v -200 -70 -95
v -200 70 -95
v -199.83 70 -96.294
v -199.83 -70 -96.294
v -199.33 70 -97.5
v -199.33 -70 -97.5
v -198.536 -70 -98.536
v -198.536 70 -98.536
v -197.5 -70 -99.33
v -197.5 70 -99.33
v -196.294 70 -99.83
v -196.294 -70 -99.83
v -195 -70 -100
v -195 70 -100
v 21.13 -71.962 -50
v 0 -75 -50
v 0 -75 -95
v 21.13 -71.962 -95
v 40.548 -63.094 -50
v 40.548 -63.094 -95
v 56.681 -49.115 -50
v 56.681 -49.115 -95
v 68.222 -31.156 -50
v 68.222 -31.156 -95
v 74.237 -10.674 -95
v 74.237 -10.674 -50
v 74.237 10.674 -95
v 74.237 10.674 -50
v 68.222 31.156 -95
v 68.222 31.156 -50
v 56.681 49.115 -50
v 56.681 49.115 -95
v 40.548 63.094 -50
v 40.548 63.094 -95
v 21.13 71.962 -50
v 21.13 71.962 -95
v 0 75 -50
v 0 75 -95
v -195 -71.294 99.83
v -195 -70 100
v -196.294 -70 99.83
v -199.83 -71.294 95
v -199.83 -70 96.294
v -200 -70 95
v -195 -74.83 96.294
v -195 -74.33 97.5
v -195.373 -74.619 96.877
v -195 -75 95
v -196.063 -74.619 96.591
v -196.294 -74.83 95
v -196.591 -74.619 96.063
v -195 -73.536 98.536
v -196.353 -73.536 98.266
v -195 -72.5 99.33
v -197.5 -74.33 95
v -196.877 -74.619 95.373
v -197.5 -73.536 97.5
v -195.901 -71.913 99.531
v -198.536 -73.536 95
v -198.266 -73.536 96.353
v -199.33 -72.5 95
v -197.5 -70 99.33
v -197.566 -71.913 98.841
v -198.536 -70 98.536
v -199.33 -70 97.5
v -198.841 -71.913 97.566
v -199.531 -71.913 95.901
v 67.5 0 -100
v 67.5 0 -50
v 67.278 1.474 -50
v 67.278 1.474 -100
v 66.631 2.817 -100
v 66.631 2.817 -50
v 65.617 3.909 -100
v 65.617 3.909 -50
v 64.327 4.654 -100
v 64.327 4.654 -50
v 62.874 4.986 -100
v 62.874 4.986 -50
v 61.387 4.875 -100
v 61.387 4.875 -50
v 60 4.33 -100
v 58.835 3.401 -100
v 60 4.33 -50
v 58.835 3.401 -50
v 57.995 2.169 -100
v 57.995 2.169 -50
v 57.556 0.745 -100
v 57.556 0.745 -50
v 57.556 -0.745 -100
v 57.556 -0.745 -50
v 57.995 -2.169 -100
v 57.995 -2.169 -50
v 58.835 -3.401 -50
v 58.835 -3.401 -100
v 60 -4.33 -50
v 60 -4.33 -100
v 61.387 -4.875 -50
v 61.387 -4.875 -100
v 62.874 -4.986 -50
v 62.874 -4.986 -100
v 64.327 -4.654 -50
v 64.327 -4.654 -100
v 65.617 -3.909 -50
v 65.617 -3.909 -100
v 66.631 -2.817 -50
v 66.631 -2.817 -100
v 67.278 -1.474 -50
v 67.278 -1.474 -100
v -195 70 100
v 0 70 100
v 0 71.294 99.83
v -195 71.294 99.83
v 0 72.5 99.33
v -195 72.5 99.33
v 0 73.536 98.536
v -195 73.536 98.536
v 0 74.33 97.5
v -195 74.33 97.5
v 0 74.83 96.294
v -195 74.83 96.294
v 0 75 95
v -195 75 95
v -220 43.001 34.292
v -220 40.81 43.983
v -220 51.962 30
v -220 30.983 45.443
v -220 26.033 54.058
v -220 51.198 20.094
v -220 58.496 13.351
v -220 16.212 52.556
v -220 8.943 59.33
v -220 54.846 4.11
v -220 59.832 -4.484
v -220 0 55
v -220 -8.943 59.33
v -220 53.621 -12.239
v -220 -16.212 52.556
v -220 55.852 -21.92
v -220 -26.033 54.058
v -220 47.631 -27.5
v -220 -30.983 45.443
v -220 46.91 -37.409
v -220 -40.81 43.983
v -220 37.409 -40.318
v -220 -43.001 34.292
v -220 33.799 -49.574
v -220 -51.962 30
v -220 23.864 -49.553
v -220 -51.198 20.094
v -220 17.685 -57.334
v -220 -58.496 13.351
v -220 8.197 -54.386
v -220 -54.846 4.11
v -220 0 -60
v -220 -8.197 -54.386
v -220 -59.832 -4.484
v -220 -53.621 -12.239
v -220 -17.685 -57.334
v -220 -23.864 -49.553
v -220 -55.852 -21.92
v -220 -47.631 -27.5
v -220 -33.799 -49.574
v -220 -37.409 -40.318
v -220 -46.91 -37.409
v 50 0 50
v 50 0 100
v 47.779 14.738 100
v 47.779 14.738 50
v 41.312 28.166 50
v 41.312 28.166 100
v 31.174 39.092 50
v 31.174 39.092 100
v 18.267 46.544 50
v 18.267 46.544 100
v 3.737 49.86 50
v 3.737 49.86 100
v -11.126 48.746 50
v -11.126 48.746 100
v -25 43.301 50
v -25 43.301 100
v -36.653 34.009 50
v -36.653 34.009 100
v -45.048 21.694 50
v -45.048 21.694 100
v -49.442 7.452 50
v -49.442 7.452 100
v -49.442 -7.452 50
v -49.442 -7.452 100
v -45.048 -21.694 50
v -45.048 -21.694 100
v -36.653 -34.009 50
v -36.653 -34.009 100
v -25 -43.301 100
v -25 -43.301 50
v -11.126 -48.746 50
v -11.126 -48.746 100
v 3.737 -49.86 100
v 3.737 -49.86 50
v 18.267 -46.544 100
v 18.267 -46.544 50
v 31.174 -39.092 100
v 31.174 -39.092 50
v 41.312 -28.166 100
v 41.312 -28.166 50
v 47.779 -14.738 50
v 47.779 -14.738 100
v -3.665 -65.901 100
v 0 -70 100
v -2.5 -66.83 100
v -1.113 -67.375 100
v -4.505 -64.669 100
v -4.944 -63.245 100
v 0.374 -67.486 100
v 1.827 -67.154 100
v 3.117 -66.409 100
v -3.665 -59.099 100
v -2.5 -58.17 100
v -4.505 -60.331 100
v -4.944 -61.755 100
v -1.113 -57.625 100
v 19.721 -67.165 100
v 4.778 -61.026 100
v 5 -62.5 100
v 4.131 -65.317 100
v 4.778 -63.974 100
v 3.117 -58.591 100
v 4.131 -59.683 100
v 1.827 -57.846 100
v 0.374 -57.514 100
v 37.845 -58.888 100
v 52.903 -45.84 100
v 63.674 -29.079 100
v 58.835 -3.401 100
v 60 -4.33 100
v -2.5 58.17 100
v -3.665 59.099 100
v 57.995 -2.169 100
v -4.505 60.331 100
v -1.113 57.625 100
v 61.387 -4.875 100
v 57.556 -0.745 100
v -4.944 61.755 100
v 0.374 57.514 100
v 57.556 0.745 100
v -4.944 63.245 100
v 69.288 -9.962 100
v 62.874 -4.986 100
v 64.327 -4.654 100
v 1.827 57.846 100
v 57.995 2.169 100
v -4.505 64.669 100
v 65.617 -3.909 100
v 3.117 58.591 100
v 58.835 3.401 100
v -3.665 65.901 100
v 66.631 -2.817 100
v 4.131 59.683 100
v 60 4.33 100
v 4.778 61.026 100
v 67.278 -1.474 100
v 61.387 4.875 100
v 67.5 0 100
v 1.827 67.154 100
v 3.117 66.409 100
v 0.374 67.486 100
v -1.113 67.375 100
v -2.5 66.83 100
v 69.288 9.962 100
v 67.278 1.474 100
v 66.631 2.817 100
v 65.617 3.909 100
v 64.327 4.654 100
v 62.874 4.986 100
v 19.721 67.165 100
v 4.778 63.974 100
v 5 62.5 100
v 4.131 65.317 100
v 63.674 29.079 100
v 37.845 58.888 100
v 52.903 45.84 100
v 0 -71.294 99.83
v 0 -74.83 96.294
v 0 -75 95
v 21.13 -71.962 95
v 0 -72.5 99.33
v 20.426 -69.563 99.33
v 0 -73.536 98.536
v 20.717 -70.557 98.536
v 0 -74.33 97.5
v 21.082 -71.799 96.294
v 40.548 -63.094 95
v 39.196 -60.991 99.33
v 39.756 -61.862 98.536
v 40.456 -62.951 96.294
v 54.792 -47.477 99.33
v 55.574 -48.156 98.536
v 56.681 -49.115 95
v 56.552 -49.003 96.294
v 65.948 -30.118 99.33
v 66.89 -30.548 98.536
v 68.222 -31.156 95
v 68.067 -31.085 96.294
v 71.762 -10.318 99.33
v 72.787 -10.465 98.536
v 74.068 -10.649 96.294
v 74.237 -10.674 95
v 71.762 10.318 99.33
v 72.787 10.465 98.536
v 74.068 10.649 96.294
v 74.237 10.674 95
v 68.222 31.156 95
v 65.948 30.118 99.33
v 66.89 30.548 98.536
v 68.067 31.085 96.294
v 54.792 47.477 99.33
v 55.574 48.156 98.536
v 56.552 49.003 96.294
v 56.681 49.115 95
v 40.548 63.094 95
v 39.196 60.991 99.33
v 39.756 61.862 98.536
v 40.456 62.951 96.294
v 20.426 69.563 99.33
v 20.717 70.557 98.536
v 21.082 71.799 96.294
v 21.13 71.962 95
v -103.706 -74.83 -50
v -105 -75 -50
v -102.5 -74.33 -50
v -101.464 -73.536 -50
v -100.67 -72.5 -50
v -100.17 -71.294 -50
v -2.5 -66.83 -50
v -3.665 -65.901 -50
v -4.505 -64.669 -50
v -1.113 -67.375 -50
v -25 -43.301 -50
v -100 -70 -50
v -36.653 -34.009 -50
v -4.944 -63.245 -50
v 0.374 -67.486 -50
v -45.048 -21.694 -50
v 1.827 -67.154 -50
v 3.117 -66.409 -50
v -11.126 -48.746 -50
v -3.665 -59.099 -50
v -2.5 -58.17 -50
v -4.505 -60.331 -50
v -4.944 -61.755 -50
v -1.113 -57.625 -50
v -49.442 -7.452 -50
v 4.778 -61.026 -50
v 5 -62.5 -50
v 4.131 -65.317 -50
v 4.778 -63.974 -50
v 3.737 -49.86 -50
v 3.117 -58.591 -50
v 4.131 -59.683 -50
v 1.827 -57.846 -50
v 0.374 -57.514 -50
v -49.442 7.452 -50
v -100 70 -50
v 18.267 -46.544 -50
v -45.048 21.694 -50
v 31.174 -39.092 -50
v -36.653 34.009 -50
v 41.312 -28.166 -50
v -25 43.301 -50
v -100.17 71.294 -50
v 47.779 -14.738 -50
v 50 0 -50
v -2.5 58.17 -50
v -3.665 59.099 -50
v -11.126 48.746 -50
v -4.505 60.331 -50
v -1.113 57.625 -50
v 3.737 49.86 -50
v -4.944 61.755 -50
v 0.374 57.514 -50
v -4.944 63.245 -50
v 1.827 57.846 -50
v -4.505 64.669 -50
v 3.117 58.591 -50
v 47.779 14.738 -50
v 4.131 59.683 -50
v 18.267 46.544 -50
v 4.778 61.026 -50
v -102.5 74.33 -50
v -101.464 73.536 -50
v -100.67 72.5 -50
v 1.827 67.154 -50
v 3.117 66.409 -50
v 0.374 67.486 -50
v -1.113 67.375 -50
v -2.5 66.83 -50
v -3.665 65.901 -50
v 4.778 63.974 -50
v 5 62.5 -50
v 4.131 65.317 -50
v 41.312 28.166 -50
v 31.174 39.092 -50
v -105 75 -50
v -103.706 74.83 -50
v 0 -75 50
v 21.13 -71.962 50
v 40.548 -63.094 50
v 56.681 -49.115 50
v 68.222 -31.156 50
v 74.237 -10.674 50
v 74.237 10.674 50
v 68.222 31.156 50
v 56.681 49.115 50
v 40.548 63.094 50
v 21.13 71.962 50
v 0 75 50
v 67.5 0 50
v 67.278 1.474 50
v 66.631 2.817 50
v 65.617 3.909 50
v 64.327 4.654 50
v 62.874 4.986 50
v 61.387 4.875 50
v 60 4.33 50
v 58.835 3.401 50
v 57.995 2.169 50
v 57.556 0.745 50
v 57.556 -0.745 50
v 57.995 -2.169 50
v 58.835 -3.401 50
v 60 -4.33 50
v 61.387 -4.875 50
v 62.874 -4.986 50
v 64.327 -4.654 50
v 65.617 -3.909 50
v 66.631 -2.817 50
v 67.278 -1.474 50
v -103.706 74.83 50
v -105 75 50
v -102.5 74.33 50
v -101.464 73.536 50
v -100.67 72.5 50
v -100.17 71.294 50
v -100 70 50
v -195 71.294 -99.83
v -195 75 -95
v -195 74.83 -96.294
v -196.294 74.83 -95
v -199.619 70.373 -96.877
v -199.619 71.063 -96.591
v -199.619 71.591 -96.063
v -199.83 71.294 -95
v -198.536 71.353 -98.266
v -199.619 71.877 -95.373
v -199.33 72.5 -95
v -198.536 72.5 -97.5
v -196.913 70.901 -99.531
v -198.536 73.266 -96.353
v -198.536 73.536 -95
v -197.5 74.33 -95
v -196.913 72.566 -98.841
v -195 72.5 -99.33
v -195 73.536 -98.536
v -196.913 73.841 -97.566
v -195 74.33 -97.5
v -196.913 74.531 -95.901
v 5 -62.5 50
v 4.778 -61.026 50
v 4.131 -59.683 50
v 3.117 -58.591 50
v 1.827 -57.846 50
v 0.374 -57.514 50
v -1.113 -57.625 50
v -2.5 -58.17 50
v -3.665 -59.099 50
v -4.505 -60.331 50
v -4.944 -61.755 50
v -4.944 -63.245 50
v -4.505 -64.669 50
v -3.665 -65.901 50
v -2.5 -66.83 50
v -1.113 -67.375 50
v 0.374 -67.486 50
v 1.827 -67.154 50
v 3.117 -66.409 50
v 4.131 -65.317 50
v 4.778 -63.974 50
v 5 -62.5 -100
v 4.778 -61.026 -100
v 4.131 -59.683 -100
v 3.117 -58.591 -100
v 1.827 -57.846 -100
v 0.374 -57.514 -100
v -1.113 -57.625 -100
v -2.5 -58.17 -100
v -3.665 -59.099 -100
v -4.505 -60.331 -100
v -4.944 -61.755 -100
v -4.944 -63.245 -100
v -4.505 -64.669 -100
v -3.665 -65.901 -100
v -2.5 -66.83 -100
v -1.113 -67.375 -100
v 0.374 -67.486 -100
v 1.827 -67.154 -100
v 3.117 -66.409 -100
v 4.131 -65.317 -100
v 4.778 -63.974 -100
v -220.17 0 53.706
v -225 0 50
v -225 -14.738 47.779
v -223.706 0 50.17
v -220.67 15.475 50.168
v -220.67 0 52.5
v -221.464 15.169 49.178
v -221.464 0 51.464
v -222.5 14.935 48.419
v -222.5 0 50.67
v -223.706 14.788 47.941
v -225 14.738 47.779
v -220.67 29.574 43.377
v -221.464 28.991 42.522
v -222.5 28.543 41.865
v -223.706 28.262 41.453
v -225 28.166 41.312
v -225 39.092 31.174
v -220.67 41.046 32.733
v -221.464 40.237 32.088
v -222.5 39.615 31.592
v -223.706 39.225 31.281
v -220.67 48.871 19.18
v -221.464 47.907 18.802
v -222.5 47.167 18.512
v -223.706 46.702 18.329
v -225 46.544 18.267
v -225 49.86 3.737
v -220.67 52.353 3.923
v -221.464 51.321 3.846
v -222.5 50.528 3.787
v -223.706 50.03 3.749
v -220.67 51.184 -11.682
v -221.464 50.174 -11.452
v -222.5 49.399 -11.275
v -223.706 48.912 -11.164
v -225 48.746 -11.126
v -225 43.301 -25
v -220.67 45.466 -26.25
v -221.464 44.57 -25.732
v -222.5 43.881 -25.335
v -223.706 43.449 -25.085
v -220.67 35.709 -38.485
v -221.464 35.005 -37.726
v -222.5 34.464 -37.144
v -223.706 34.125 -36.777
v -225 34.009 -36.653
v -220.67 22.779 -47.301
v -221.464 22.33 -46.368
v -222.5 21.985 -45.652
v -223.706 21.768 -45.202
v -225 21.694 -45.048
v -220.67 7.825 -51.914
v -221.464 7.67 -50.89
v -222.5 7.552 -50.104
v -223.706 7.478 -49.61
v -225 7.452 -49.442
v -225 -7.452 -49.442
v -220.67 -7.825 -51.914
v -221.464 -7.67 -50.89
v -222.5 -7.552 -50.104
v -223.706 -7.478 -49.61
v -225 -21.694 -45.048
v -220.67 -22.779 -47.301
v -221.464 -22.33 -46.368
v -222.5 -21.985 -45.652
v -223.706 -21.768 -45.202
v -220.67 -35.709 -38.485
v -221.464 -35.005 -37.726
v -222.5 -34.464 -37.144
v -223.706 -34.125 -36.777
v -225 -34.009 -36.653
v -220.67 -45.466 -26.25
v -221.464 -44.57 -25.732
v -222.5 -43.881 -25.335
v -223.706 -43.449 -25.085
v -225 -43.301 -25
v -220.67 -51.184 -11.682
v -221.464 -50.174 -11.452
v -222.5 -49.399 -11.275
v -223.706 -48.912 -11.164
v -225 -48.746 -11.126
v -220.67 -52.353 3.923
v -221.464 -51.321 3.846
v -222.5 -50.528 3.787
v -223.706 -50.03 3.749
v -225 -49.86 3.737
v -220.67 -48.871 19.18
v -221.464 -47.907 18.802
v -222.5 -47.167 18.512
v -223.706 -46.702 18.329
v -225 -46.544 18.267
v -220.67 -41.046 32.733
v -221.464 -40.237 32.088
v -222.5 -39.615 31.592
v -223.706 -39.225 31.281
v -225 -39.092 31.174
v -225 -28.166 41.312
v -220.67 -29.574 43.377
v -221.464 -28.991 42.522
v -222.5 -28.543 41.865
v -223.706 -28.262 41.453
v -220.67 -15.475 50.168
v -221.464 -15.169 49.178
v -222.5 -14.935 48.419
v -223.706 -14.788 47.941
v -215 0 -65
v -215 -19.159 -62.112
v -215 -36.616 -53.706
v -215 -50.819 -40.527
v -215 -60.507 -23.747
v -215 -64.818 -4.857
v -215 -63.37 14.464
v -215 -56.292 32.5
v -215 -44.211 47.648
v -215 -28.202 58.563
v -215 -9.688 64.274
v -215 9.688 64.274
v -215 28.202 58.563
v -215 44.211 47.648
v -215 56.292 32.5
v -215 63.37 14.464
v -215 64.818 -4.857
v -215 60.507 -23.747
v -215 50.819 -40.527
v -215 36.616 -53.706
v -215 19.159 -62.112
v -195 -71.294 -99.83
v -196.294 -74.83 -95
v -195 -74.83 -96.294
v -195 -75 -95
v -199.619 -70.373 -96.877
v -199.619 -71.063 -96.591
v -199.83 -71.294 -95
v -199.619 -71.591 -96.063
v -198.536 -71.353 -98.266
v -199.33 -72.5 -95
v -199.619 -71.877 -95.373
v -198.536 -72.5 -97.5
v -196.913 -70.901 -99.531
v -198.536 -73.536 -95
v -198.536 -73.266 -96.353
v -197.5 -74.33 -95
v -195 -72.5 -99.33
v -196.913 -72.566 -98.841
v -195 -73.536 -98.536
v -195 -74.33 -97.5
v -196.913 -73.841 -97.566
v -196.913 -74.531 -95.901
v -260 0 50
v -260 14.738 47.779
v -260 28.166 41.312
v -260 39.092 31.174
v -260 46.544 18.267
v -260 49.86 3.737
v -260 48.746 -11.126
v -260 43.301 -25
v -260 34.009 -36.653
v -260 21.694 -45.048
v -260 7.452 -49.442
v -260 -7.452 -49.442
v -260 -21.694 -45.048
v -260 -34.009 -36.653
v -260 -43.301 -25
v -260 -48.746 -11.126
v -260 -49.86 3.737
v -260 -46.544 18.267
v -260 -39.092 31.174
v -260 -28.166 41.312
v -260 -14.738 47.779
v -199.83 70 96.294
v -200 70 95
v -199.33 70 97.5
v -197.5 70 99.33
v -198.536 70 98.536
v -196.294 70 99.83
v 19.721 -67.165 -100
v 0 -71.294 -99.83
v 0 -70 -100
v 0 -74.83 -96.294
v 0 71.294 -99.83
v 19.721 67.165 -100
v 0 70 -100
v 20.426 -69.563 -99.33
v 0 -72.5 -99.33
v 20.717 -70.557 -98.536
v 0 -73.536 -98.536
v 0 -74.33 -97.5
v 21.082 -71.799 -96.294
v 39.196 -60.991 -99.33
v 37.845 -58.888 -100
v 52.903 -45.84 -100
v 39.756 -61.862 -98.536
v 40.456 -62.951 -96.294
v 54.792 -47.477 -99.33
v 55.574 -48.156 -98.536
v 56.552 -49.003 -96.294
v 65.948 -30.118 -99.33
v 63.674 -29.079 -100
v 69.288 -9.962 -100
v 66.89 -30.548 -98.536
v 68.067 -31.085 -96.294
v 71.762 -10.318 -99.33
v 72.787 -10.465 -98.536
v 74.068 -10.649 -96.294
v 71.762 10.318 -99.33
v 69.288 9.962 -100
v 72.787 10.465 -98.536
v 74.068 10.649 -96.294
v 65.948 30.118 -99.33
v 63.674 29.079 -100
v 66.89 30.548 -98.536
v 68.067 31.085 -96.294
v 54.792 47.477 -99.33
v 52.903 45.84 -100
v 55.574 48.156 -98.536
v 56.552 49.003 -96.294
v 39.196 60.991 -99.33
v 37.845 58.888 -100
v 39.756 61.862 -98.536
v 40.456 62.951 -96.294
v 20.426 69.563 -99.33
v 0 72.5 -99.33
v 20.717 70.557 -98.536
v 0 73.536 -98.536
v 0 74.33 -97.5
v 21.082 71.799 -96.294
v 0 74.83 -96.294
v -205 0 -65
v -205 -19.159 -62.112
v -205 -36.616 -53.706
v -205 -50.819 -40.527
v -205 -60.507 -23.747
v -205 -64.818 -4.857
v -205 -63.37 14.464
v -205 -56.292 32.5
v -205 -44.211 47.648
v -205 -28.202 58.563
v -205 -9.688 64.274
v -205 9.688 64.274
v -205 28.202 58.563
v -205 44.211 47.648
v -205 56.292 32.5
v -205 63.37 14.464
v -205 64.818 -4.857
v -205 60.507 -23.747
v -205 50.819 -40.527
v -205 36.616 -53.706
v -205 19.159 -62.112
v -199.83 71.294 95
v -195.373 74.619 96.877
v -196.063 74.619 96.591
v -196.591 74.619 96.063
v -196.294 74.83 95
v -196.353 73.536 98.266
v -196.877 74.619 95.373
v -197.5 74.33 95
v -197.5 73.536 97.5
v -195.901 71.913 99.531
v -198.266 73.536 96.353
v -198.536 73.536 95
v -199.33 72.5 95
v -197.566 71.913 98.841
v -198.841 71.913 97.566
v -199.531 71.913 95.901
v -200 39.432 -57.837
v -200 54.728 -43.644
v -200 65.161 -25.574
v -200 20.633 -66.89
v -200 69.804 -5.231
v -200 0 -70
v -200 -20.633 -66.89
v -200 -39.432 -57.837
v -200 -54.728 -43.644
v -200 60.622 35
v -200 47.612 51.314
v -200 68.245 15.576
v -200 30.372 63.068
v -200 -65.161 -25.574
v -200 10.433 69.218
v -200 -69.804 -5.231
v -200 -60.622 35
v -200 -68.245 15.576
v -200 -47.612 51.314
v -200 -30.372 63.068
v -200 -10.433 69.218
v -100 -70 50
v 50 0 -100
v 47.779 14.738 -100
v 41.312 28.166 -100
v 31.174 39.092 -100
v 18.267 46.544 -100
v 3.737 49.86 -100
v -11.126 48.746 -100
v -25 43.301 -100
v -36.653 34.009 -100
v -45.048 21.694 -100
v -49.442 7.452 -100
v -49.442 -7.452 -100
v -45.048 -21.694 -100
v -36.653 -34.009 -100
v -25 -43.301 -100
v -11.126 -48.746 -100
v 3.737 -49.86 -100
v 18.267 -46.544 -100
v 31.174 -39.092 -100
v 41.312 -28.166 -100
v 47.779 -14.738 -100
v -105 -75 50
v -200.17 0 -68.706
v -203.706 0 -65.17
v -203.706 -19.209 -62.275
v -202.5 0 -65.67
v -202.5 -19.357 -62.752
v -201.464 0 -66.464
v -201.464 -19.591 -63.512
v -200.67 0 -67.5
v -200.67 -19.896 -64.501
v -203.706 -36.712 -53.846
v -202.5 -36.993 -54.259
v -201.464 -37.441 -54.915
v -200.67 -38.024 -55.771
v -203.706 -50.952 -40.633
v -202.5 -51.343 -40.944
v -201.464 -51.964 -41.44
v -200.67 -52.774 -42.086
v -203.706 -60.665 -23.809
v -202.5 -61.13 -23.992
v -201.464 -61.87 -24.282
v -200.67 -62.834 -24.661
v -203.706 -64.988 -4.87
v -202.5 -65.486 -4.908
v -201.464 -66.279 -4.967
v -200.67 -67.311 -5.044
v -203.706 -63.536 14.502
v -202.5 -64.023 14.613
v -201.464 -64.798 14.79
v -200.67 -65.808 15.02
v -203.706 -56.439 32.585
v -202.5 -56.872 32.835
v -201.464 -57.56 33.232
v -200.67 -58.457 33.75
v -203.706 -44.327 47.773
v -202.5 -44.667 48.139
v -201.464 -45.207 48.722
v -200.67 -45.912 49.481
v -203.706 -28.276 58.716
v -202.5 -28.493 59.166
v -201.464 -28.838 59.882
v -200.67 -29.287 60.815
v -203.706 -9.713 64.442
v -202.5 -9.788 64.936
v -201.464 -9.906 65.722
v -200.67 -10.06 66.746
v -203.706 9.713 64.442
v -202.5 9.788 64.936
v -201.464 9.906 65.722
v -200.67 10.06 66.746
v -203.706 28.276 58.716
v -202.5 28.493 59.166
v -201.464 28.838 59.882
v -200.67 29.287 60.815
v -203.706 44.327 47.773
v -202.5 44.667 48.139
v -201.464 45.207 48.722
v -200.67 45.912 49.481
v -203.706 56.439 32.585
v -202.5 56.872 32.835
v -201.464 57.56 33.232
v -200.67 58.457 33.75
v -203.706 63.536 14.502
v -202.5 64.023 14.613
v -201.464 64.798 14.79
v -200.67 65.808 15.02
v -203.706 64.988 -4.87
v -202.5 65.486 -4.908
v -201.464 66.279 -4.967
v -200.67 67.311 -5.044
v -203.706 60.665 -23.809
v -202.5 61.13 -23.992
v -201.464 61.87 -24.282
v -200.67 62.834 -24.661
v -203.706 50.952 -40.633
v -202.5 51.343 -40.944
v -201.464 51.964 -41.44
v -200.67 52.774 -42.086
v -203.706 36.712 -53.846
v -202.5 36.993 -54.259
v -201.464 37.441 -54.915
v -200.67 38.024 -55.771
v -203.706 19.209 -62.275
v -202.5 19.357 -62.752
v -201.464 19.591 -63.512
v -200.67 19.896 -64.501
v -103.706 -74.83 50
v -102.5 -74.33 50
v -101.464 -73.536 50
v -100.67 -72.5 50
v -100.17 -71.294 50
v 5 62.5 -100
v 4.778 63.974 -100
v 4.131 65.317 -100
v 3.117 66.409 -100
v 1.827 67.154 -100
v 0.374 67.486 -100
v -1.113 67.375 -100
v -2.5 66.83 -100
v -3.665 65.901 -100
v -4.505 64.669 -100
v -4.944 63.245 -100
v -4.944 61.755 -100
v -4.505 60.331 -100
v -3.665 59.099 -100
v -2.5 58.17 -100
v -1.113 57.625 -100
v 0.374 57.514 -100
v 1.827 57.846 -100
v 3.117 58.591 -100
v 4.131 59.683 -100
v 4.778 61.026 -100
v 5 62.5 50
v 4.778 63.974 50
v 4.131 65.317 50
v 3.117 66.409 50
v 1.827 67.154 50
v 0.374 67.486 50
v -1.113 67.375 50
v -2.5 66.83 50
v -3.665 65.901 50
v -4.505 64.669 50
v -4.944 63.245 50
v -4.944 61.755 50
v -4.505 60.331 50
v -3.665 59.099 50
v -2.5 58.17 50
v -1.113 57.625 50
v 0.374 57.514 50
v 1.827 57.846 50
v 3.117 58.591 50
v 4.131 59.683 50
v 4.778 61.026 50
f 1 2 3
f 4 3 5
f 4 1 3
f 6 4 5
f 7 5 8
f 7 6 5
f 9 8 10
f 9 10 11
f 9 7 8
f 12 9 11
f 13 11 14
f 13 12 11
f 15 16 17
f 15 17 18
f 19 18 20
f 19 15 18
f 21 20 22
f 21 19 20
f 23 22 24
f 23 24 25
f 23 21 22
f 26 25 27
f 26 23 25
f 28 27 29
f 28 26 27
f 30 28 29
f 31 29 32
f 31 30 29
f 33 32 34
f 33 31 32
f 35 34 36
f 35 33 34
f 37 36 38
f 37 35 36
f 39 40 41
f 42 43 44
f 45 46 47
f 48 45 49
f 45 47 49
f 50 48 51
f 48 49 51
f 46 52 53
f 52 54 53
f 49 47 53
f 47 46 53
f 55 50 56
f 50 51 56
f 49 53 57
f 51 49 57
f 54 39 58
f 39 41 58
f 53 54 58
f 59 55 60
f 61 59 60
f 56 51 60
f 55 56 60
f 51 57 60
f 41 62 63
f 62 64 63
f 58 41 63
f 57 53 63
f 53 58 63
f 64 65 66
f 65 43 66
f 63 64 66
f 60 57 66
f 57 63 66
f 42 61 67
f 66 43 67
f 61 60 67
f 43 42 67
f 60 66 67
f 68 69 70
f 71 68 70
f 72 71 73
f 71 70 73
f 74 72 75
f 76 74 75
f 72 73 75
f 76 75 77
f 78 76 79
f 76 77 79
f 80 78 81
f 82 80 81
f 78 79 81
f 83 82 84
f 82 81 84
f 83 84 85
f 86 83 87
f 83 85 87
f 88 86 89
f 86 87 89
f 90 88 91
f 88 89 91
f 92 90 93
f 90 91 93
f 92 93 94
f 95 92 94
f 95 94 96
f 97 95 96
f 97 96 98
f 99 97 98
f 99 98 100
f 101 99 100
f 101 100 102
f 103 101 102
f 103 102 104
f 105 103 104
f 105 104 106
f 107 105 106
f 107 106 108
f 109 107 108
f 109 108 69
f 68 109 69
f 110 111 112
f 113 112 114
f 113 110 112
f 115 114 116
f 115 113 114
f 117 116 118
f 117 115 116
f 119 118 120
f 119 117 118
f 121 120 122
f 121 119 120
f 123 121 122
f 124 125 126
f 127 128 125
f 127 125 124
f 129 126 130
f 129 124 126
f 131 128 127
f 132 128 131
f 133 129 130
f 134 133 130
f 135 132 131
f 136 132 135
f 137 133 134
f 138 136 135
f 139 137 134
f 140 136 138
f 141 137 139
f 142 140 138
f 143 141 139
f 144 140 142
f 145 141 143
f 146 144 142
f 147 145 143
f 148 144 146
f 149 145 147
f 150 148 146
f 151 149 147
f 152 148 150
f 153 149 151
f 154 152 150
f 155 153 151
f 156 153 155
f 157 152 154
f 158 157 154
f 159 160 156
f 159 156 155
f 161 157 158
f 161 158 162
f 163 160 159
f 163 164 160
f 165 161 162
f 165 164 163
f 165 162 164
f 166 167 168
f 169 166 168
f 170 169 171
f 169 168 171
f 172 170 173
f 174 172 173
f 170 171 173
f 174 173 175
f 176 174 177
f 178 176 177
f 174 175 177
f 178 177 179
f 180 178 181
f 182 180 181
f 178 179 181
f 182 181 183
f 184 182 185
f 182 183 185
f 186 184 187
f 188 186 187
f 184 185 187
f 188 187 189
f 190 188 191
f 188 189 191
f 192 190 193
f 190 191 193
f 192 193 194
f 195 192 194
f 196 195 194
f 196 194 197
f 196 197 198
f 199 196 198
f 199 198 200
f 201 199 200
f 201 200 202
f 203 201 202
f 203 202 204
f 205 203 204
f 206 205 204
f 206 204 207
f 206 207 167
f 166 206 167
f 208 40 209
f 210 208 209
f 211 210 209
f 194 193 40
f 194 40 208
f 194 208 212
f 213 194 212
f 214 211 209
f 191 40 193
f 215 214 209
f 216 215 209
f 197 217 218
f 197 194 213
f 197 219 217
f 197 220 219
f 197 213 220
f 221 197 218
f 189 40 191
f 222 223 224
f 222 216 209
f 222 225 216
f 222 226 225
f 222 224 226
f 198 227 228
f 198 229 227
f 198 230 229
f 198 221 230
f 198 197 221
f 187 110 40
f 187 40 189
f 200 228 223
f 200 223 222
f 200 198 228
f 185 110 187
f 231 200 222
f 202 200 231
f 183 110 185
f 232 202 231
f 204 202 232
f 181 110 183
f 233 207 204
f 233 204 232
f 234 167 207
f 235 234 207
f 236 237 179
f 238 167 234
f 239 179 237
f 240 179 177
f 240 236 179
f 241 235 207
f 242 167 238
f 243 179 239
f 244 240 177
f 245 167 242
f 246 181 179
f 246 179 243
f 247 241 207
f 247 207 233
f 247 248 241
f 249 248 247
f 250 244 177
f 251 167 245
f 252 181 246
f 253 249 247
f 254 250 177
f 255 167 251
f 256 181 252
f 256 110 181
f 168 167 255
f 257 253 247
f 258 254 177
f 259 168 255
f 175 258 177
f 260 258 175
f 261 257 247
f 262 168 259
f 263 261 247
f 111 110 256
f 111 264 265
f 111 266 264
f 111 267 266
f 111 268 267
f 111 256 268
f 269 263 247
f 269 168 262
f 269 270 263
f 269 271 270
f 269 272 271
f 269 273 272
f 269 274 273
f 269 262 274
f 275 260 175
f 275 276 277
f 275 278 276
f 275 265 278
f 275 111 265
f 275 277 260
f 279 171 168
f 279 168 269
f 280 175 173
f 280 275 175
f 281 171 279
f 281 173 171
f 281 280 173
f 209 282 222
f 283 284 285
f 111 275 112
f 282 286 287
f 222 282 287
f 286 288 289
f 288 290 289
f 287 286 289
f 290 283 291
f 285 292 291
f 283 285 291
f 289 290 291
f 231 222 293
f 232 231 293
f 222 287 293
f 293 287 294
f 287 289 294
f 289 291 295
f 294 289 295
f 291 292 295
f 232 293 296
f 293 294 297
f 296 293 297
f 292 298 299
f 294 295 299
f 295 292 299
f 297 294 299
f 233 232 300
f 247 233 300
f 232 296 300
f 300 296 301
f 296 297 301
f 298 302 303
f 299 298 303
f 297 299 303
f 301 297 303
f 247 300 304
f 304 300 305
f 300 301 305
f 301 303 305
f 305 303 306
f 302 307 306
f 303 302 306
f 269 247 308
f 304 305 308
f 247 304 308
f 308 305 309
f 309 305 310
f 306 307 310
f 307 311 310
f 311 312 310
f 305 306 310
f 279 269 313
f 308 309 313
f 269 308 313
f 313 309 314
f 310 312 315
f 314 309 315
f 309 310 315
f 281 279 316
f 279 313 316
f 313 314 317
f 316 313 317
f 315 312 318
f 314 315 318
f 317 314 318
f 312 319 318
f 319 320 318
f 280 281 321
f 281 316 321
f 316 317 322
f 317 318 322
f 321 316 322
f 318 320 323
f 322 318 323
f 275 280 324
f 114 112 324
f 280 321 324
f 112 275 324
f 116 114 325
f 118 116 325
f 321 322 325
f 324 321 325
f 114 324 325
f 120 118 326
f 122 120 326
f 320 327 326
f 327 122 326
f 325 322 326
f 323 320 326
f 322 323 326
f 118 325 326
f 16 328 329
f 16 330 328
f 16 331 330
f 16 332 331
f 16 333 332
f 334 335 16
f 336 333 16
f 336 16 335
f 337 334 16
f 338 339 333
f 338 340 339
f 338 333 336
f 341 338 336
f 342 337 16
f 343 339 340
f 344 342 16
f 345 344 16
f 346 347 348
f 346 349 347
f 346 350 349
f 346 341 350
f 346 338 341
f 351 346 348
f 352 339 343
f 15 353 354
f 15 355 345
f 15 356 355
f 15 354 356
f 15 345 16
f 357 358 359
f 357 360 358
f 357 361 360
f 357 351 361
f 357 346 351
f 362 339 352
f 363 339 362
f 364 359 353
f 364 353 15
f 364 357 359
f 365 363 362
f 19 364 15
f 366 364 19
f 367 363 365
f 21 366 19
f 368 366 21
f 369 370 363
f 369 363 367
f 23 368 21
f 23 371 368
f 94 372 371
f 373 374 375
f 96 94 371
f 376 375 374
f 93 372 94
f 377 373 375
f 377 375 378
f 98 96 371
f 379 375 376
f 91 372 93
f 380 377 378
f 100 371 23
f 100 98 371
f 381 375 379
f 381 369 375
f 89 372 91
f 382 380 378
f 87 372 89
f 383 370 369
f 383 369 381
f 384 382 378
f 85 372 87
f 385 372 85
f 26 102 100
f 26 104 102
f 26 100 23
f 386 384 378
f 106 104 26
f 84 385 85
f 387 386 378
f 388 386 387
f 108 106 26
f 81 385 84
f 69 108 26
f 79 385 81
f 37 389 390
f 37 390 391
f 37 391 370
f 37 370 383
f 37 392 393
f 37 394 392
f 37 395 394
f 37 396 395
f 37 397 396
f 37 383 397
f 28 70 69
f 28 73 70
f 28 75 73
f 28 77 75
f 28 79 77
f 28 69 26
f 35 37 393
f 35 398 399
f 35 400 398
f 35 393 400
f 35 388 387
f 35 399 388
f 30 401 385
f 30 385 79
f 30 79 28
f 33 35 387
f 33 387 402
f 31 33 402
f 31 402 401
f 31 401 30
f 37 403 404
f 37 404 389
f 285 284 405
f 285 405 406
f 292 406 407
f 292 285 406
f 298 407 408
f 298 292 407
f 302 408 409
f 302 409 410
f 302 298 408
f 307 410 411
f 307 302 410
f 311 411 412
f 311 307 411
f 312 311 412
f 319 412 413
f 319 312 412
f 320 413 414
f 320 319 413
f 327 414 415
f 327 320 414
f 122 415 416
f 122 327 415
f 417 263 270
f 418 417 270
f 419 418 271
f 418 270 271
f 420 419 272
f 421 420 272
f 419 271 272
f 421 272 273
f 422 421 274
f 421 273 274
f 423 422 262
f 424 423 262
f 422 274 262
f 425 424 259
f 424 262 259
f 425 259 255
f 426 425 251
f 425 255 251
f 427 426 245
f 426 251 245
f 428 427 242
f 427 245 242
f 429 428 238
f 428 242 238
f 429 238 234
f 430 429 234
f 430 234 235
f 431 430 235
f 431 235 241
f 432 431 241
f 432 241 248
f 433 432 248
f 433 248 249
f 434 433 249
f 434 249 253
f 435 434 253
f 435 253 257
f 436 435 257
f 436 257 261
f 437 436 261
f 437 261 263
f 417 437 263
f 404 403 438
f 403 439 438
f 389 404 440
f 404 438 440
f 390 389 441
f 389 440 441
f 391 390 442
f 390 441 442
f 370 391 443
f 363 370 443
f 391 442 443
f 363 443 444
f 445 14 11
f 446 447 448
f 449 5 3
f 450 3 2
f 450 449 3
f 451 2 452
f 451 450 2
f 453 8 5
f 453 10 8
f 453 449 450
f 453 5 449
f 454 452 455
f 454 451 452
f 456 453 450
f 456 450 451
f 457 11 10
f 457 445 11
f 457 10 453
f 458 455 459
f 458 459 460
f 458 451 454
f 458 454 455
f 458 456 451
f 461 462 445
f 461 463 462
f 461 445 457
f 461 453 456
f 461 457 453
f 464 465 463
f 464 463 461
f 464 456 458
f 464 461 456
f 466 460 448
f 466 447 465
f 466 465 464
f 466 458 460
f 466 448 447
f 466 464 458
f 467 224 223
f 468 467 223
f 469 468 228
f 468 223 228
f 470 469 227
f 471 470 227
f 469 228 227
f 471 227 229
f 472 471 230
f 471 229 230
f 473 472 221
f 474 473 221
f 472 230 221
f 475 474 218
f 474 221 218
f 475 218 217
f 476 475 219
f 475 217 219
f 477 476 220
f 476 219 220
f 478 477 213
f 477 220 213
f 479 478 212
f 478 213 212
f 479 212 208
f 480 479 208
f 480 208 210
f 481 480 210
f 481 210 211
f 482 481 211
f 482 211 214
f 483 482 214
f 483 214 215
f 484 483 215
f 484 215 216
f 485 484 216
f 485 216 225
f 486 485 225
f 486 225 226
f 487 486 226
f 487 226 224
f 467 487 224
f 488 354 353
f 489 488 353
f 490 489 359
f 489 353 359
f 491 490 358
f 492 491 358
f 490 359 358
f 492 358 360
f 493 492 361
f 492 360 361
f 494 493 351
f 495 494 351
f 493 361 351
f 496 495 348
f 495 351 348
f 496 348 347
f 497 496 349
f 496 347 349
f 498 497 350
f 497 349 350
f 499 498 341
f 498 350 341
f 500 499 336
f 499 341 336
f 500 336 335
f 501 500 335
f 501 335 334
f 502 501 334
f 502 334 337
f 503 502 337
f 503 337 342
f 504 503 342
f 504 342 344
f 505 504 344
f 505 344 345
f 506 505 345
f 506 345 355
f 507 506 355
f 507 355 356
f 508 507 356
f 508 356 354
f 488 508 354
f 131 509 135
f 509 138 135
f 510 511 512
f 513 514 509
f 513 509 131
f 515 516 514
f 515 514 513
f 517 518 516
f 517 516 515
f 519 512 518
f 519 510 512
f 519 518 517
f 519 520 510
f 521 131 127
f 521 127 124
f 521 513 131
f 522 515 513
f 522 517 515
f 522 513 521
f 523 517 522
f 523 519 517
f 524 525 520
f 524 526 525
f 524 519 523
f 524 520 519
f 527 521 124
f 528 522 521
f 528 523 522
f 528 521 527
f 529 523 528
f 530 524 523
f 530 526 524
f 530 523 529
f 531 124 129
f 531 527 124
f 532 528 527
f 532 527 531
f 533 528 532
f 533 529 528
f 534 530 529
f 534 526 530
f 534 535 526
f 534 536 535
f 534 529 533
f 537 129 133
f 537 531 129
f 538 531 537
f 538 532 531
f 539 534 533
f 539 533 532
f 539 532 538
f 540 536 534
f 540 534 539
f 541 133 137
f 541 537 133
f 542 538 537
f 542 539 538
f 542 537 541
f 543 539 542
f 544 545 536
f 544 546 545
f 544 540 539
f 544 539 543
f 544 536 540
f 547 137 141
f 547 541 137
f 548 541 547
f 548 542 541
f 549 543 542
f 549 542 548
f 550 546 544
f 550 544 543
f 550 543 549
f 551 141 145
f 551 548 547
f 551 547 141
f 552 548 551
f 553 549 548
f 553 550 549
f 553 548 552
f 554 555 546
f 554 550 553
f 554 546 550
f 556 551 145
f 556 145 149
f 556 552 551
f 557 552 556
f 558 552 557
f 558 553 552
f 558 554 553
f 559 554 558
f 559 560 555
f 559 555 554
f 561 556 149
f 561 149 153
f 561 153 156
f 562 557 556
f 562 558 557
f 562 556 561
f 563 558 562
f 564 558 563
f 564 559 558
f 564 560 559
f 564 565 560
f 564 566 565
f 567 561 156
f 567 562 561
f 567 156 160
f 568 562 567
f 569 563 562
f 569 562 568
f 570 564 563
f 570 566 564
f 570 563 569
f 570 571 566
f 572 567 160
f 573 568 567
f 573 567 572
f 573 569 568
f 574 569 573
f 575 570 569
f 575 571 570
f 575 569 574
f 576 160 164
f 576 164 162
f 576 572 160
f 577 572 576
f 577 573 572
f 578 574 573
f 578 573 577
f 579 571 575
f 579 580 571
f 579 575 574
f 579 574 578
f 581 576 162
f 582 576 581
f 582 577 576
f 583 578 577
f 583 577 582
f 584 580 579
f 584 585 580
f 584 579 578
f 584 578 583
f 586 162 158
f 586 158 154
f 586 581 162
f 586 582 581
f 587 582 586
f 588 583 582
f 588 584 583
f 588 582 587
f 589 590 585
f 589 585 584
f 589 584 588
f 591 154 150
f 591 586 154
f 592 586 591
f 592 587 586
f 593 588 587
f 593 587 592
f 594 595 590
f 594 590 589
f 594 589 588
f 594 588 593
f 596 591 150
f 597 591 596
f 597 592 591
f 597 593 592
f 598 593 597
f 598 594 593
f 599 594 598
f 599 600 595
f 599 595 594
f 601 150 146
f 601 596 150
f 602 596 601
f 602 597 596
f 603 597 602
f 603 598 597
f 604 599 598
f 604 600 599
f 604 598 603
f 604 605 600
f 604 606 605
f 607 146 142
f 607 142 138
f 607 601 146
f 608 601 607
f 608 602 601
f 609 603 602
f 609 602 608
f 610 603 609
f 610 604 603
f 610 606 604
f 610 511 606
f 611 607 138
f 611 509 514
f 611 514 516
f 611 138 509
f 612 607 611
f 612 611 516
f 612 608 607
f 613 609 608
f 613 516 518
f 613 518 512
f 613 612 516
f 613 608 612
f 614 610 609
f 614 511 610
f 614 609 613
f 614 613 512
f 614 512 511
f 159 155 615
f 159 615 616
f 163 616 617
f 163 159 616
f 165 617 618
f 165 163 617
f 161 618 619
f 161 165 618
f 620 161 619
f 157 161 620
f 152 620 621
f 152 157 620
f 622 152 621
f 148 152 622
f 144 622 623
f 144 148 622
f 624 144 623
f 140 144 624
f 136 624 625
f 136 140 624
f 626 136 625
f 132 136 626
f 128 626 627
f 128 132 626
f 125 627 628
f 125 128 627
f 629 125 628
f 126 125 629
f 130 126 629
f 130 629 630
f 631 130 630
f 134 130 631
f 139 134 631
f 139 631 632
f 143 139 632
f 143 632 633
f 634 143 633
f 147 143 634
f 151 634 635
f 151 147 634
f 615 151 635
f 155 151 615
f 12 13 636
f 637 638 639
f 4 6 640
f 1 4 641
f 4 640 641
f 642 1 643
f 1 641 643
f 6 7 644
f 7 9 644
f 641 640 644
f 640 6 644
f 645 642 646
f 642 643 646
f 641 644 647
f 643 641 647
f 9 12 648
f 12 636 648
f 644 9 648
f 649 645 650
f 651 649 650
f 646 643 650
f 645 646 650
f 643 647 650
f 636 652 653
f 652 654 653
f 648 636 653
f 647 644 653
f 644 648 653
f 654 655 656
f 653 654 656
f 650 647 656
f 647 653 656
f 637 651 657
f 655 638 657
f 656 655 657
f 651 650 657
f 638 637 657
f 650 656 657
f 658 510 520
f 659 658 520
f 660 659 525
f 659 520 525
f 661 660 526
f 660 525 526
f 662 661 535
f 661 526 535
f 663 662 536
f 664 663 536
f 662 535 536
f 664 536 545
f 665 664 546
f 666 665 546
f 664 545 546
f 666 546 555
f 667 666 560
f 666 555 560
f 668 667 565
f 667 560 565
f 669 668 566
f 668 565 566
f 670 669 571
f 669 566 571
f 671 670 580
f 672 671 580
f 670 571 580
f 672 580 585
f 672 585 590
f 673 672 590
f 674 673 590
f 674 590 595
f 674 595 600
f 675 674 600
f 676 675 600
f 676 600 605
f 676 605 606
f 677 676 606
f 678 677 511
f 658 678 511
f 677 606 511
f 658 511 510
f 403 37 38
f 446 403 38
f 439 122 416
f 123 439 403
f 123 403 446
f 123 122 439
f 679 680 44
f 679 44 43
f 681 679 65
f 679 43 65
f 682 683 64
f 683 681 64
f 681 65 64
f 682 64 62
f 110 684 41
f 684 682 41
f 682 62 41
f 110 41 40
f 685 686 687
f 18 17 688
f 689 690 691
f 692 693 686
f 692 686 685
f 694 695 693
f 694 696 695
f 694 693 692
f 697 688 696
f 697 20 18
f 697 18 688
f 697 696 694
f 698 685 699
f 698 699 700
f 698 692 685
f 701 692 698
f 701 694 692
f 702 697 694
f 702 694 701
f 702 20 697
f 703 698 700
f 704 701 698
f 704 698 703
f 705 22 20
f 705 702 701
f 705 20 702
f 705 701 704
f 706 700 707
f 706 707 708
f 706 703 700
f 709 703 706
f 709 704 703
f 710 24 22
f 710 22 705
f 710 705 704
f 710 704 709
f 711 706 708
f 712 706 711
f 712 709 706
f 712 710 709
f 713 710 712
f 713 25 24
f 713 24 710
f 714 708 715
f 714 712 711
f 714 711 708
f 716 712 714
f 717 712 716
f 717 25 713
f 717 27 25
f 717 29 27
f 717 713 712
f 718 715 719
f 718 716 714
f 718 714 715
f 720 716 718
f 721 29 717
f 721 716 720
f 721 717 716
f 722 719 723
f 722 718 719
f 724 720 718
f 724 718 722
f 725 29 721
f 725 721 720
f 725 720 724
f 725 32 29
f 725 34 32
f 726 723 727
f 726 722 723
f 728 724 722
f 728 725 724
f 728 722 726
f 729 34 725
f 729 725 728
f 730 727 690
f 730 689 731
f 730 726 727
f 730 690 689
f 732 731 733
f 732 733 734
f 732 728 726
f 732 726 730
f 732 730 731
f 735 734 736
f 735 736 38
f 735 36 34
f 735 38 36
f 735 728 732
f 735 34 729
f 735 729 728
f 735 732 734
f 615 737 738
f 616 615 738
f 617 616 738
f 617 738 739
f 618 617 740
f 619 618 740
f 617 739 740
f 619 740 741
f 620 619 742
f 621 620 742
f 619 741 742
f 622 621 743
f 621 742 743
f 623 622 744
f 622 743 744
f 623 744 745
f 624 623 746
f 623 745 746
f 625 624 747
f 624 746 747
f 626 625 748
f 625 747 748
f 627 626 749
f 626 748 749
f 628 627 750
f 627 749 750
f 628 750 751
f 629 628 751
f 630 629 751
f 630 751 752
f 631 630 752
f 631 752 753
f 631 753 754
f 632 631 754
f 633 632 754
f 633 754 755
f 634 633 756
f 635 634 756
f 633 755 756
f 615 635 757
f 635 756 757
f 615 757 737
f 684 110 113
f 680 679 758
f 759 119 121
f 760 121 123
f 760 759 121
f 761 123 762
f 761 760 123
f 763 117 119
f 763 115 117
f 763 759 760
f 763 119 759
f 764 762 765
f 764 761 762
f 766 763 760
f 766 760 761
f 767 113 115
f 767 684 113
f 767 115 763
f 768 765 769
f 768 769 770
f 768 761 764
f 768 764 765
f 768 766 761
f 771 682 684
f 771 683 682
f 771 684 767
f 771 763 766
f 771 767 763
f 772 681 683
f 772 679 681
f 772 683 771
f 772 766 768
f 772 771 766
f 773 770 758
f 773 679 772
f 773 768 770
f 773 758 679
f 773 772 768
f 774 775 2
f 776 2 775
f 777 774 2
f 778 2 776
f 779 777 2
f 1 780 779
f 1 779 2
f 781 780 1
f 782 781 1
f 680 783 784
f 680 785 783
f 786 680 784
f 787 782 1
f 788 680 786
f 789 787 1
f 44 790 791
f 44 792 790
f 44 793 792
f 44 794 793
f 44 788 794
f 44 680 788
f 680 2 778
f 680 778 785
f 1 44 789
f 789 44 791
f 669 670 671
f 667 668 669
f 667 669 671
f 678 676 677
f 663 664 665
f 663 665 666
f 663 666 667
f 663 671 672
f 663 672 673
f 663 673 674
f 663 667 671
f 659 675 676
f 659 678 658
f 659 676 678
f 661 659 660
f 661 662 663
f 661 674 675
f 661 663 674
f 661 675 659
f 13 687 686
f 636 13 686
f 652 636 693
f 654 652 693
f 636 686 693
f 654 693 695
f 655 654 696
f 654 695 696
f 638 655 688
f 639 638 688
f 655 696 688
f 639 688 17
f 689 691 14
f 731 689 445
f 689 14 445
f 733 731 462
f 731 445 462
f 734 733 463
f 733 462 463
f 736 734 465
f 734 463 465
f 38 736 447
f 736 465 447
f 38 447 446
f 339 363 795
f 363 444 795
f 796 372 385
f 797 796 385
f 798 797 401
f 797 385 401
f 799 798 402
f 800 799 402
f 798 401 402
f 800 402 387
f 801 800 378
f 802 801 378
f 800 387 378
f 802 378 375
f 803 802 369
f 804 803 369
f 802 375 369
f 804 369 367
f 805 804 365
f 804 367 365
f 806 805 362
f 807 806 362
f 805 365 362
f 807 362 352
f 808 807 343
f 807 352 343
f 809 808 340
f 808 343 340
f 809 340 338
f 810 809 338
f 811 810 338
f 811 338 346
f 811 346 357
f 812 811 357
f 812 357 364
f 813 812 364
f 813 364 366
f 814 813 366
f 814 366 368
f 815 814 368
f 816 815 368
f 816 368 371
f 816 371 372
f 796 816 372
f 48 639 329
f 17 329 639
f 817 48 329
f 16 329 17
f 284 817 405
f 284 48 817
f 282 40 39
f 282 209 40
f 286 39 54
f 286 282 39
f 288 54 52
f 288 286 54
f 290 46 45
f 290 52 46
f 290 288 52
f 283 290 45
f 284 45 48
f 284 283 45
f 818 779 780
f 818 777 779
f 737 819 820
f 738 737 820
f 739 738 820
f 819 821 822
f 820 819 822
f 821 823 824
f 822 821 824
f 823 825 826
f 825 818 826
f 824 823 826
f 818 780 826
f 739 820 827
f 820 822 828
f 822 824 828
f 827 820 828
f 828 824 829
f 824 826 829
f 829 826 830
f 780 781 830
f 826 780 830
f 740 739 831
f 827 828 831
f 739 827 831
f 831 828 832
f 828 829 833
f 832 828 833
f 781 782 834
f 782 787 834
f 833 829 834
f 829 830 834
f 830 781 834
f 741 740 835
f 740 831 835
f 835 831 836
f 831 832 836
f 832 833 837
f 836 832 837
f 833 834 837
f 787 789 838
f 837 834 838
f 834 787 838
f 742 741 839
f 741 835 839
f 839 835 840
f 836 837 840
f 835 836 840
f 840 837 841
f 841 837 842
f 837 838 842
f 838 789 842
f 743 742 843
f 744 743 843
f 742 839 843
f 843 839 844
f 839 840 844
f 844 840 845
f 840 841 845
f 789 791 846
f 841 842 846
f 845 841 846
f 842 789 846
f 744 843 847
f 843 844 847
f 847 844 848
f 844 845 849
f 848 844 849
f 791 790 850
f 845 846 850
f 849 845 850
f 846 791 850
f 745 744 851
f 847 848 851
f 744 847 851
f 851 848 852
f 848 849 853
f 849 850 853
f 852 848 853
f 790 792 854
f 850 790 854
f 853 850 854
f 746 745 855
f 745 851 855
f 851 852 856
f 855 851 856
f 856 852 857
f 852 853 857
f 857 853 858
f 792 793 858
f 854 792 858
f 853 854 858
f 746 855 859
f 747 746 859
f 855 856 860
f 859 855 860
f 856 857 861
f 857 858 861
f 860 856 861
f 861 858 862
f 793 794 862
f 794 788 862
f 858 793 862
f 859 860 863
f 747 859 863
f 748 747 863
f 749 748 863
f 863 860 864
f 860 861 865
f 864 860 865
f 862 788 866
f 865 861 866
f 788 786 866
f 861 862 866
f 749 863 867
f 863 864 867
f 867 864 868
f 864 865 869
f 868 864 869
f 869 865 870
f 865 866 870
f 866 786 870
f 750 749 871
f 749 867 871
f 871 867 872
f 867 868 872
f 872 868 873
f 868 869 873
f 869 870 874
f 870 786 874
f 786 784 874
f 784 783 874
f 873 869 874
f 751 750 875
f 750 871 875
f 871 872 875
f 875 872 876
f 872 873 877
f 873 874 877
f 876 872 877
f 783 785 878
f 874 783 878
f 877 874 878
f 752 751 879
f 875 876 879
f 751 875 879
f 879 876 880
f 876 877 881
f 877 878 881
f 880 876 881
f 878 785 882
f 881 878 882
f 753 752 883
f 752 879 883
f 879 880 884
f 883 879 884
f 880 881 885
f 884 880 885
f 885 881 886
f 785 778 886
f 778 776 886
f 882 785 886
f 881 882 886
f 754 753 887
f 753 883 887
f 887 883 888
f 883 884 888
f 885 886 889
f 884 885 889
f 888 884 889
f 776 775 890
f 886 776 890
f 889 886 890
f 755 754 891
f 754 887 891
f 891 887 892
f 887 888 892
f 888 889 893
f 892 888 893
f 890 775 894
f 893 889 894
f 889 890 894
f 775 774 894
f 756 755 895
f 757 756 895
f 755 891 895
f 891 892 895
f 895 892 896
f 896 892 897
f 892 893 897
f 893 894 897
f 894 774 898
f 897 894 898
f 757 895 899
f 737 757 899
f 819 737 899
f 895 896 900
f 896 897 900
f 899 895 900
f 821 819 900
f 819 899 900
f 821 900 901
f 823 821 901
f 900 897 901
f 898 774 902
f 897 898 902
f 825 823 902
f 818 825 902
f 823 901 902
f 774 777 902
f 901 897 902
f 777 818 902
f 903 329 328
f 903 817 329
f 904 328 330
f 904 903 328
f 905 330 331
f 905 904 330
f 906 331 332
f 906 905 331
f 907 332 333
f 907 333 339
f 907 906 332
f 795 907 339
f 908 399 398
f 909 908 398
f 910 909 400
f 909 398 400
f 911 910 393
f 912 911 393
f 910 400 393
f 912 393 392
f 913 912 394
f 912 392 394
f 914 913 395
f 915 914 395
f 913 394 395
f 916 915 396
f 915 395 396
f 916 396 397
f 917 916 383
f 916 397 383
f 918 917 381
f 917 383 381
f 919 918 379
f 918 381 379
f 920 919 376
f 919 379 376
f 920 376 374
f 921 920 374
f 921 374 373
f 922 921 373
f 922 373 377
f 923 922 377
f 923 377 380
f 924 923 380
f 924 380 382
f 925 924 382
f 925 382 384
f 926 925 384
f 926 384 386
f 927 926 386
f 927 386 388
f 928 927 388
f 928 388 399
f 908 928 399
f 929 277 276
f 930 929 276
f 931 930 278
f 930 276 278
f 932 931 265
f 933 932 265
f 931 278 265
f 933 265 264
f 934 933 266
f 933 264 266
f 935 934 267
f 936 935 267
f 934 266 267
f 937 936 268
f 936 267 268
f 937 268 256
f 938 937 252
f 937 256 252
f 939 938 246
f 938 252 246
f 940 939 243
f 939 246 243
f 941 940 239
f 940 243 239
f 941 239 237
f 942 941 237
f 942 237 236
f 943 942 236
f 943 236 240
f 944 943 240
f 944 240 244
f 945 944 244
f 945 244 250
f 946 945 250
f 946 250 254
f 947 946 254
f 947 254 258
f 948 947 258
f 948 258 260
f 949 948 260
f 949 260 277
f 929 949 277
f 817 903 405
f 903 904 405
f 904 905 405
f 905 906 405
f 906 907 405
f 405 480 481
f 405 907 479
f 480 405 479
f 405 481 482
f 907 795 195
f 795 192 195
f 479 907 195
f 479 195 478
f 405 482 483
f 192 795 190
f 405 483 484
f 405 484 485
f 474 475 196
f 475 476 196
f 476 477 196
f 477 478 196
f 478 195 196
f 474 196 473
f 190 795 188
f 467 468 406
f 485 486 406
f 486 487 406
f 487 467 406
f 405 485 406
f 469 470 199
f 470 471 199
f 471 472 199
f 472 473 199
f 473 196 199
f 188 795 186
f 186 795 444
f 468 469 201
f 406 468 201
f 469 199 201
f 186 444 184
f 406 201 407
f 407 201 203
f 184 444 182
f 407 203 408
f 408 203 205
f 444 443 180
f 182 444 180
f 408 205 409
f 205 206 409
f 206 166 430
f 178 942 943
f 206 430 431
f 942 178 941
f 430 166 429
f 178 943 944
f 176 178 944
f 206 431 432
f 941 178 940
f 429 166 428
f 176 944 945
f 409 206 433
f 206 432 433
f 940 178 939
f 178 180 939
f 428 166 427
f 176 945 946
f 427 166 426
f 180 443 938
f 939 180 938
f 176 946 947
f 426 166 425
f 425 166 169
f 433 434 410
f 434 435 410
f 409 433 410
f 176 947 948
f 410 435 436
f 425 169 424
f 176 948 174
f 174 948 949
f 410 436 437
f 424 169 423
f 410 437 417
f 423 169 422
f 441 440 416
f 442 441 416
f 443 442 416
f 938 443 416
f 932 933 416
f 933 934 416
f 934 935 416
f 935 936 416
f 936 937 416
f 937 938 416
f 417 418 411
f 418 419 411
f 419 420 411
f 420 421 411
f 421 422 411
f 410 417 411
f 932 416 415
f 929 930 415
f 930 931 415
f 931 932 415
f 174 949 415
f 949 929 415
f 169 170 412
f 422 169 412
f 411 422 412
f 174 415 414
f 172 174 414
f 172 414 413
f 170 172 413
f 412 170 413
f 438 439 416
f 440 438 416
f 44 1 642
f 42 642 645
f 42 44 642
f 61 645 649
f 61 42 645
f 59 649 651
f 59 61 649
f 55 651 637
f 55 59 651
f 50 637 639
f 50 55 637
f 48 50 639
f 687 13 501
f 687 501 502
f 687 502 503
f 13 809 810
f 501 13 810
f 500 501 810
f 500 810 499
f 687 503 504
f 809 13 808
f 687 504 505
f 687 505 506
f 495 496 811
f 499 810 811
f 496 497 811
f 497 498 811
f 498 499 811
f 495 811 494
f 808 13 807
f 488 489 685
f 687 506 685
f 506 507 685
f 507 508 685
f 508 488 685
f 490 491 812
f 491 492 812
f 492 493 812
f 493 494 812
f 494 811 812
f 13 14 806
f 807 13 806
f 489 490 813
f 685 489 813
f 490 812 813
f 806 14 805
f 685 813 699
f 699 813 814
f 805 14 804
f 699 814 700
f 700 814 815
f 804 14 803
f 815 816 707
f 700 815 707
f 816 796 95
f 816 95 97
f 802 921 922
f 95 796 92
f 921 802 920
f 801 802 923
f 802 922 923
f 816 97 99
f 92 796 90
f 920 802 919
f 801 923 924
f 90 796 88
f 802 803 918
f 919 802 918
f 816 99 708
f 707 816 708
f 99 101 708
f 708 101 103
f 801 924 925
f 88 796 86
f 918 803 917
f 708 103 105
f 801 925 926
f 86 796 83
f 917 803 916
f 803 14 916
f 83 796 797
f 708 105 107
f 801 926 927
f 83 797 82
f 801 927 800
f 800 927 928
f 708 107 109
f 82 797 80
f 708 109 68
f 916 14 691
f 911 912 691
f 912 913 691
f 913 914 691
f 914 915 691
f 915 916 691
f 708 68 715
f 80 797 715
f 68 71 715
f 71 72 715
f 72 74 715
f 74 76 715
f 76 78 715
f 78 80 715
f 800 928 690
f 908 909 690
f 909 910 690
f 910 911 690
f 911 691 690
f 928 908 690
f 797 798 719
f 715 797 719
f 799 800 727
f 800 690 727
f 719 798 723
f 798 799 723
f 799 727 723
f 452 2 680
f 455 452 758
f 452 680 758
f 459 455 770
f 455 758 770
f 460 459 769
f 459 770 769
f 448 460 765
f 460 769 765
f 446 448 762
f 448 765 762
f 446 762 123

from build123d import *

# Parameters (mm, degrees)
BOSS_EXTRUDE1_DEPTH = 100
CUT_EXTRUDE1_DEPTH  = 50
SKETCH3_R           = 65
BOSS_EXTRUDE2_DEPTH = 20
SKETCH4_R           = 50
BOSS_EXTRUDE3_DEPTH = 40
CHAMFER1_SIZE       = 5
SKETCH5_R           = 5
CUT_EXTRUDE2_DEPTH  = 337.489227168
FILLET1_R           = 5
SKETCH6_R           = 50
CUT_EXTRUDE3_DEPTH  = 337.489227168


with BuildPart() as part:
    # Sketch1 → Boss-Extrude1 (new, symmetric)
    with BuildSketch(Plane.XY):
        with BuildLine():
            Line((0, 75), (-200, 75))
            Line((-200, 75), (-200, -75))
            Line((-200, -75), (0, -75))
            ThreePointArc((0, -75), (75, 0), (0, 75))
        make_face()
    extrude(amount=BOSS_EXTRUDE1_DEPTH, both=True)

    # Sketch2 → Cut-Extrude1 (cut, symmetric)
    with BuildSketch(Plane.XY):
        with BuildLine():
            Line((0, 75), (-100, 75))
            Line((-100, 75), (-100, -75))
            Line((-100, -75), (0, -75))
            ThreePointArc((0, -75), (75, 0), (0, 75))
        make_face()
    extrude(amount=CUT_EXTRUDE1_DEPTH, both=True, mode=Mode.SUBTRACT)

    # Sketch3 → Boss-Extrude2 (add)
    with BuildSketch(Plane.ZY.offset(200)):
        with Locations(Location((0, 0, 0), (0, 0, 180))):
            Circle(SKETCH3_R)
    extrude(amount=BOSS_EXTRUDE2_DEPTH)

    # Sketch4 → Boss-Extrude3 (add)
    with BuildSketch(Plane.ZY.offset(220)):
        Circle(SKETCH4_R)
    extrude(amount=BOSS_EXTRUDE3_DEPTH)

    # Chamfer1
    chamfer1_edges = [part.edges().sort_by_distance(p)[0] for p in [
        (-220, 0, 65),
    ]]
    chamfer(chamfer1_edges, length=CHAMFER1_SIZE)

    # Sketch5 → Cut-Extrude2 (cut, through all)
    with BuildSketch(Plane.XY.offset(100)):
        with Locations((0, 62.5)):
            Circle(SKETCH5_R)
        with Locations((62.5, 0)):
            Circle(SKETCH5_R)
        with Locations((0, -62.5)):
            Circle(SKETCH5_R)
    extrude(amount=-CUT_EXTRUDE2_DEPTH, mode=Mode.SUBTRACT)

    # Fillet1
    fillet1_edges = [part.edges().sort_by_distance(p)[0] for p in [
        (-200, 0, 100),
        (-100, -75, 100),
        (-100, -75, 0),
        (-100, 75, 0),
        (-200, 0, 65),
        (-220, 0, -50),
        (75, 0, 100),
        (-100, -75, -100),
        (-200, 0, -100),
        (-100, 75, -100),
        (75, 0, -100),
        (-100, 75, 100),
        (-200, -75, 0),
        (-200, 75, 0),
    ]]
    fillet(fillet1_edges, radius=FILLET1_R - 0.0001)  # a hair under: the kernel refuses the full size

    # Sketch6 → Cut-Extrude3 (cut, through all)
    with BuildSketch(Plane.XY.offset(100)):
        Circle(SKETCH6_R)
    extrude(amount=-CUT_EXTRUDE3_DEPTH, mode=Mode.SUBTRACT)


solid = part.part
